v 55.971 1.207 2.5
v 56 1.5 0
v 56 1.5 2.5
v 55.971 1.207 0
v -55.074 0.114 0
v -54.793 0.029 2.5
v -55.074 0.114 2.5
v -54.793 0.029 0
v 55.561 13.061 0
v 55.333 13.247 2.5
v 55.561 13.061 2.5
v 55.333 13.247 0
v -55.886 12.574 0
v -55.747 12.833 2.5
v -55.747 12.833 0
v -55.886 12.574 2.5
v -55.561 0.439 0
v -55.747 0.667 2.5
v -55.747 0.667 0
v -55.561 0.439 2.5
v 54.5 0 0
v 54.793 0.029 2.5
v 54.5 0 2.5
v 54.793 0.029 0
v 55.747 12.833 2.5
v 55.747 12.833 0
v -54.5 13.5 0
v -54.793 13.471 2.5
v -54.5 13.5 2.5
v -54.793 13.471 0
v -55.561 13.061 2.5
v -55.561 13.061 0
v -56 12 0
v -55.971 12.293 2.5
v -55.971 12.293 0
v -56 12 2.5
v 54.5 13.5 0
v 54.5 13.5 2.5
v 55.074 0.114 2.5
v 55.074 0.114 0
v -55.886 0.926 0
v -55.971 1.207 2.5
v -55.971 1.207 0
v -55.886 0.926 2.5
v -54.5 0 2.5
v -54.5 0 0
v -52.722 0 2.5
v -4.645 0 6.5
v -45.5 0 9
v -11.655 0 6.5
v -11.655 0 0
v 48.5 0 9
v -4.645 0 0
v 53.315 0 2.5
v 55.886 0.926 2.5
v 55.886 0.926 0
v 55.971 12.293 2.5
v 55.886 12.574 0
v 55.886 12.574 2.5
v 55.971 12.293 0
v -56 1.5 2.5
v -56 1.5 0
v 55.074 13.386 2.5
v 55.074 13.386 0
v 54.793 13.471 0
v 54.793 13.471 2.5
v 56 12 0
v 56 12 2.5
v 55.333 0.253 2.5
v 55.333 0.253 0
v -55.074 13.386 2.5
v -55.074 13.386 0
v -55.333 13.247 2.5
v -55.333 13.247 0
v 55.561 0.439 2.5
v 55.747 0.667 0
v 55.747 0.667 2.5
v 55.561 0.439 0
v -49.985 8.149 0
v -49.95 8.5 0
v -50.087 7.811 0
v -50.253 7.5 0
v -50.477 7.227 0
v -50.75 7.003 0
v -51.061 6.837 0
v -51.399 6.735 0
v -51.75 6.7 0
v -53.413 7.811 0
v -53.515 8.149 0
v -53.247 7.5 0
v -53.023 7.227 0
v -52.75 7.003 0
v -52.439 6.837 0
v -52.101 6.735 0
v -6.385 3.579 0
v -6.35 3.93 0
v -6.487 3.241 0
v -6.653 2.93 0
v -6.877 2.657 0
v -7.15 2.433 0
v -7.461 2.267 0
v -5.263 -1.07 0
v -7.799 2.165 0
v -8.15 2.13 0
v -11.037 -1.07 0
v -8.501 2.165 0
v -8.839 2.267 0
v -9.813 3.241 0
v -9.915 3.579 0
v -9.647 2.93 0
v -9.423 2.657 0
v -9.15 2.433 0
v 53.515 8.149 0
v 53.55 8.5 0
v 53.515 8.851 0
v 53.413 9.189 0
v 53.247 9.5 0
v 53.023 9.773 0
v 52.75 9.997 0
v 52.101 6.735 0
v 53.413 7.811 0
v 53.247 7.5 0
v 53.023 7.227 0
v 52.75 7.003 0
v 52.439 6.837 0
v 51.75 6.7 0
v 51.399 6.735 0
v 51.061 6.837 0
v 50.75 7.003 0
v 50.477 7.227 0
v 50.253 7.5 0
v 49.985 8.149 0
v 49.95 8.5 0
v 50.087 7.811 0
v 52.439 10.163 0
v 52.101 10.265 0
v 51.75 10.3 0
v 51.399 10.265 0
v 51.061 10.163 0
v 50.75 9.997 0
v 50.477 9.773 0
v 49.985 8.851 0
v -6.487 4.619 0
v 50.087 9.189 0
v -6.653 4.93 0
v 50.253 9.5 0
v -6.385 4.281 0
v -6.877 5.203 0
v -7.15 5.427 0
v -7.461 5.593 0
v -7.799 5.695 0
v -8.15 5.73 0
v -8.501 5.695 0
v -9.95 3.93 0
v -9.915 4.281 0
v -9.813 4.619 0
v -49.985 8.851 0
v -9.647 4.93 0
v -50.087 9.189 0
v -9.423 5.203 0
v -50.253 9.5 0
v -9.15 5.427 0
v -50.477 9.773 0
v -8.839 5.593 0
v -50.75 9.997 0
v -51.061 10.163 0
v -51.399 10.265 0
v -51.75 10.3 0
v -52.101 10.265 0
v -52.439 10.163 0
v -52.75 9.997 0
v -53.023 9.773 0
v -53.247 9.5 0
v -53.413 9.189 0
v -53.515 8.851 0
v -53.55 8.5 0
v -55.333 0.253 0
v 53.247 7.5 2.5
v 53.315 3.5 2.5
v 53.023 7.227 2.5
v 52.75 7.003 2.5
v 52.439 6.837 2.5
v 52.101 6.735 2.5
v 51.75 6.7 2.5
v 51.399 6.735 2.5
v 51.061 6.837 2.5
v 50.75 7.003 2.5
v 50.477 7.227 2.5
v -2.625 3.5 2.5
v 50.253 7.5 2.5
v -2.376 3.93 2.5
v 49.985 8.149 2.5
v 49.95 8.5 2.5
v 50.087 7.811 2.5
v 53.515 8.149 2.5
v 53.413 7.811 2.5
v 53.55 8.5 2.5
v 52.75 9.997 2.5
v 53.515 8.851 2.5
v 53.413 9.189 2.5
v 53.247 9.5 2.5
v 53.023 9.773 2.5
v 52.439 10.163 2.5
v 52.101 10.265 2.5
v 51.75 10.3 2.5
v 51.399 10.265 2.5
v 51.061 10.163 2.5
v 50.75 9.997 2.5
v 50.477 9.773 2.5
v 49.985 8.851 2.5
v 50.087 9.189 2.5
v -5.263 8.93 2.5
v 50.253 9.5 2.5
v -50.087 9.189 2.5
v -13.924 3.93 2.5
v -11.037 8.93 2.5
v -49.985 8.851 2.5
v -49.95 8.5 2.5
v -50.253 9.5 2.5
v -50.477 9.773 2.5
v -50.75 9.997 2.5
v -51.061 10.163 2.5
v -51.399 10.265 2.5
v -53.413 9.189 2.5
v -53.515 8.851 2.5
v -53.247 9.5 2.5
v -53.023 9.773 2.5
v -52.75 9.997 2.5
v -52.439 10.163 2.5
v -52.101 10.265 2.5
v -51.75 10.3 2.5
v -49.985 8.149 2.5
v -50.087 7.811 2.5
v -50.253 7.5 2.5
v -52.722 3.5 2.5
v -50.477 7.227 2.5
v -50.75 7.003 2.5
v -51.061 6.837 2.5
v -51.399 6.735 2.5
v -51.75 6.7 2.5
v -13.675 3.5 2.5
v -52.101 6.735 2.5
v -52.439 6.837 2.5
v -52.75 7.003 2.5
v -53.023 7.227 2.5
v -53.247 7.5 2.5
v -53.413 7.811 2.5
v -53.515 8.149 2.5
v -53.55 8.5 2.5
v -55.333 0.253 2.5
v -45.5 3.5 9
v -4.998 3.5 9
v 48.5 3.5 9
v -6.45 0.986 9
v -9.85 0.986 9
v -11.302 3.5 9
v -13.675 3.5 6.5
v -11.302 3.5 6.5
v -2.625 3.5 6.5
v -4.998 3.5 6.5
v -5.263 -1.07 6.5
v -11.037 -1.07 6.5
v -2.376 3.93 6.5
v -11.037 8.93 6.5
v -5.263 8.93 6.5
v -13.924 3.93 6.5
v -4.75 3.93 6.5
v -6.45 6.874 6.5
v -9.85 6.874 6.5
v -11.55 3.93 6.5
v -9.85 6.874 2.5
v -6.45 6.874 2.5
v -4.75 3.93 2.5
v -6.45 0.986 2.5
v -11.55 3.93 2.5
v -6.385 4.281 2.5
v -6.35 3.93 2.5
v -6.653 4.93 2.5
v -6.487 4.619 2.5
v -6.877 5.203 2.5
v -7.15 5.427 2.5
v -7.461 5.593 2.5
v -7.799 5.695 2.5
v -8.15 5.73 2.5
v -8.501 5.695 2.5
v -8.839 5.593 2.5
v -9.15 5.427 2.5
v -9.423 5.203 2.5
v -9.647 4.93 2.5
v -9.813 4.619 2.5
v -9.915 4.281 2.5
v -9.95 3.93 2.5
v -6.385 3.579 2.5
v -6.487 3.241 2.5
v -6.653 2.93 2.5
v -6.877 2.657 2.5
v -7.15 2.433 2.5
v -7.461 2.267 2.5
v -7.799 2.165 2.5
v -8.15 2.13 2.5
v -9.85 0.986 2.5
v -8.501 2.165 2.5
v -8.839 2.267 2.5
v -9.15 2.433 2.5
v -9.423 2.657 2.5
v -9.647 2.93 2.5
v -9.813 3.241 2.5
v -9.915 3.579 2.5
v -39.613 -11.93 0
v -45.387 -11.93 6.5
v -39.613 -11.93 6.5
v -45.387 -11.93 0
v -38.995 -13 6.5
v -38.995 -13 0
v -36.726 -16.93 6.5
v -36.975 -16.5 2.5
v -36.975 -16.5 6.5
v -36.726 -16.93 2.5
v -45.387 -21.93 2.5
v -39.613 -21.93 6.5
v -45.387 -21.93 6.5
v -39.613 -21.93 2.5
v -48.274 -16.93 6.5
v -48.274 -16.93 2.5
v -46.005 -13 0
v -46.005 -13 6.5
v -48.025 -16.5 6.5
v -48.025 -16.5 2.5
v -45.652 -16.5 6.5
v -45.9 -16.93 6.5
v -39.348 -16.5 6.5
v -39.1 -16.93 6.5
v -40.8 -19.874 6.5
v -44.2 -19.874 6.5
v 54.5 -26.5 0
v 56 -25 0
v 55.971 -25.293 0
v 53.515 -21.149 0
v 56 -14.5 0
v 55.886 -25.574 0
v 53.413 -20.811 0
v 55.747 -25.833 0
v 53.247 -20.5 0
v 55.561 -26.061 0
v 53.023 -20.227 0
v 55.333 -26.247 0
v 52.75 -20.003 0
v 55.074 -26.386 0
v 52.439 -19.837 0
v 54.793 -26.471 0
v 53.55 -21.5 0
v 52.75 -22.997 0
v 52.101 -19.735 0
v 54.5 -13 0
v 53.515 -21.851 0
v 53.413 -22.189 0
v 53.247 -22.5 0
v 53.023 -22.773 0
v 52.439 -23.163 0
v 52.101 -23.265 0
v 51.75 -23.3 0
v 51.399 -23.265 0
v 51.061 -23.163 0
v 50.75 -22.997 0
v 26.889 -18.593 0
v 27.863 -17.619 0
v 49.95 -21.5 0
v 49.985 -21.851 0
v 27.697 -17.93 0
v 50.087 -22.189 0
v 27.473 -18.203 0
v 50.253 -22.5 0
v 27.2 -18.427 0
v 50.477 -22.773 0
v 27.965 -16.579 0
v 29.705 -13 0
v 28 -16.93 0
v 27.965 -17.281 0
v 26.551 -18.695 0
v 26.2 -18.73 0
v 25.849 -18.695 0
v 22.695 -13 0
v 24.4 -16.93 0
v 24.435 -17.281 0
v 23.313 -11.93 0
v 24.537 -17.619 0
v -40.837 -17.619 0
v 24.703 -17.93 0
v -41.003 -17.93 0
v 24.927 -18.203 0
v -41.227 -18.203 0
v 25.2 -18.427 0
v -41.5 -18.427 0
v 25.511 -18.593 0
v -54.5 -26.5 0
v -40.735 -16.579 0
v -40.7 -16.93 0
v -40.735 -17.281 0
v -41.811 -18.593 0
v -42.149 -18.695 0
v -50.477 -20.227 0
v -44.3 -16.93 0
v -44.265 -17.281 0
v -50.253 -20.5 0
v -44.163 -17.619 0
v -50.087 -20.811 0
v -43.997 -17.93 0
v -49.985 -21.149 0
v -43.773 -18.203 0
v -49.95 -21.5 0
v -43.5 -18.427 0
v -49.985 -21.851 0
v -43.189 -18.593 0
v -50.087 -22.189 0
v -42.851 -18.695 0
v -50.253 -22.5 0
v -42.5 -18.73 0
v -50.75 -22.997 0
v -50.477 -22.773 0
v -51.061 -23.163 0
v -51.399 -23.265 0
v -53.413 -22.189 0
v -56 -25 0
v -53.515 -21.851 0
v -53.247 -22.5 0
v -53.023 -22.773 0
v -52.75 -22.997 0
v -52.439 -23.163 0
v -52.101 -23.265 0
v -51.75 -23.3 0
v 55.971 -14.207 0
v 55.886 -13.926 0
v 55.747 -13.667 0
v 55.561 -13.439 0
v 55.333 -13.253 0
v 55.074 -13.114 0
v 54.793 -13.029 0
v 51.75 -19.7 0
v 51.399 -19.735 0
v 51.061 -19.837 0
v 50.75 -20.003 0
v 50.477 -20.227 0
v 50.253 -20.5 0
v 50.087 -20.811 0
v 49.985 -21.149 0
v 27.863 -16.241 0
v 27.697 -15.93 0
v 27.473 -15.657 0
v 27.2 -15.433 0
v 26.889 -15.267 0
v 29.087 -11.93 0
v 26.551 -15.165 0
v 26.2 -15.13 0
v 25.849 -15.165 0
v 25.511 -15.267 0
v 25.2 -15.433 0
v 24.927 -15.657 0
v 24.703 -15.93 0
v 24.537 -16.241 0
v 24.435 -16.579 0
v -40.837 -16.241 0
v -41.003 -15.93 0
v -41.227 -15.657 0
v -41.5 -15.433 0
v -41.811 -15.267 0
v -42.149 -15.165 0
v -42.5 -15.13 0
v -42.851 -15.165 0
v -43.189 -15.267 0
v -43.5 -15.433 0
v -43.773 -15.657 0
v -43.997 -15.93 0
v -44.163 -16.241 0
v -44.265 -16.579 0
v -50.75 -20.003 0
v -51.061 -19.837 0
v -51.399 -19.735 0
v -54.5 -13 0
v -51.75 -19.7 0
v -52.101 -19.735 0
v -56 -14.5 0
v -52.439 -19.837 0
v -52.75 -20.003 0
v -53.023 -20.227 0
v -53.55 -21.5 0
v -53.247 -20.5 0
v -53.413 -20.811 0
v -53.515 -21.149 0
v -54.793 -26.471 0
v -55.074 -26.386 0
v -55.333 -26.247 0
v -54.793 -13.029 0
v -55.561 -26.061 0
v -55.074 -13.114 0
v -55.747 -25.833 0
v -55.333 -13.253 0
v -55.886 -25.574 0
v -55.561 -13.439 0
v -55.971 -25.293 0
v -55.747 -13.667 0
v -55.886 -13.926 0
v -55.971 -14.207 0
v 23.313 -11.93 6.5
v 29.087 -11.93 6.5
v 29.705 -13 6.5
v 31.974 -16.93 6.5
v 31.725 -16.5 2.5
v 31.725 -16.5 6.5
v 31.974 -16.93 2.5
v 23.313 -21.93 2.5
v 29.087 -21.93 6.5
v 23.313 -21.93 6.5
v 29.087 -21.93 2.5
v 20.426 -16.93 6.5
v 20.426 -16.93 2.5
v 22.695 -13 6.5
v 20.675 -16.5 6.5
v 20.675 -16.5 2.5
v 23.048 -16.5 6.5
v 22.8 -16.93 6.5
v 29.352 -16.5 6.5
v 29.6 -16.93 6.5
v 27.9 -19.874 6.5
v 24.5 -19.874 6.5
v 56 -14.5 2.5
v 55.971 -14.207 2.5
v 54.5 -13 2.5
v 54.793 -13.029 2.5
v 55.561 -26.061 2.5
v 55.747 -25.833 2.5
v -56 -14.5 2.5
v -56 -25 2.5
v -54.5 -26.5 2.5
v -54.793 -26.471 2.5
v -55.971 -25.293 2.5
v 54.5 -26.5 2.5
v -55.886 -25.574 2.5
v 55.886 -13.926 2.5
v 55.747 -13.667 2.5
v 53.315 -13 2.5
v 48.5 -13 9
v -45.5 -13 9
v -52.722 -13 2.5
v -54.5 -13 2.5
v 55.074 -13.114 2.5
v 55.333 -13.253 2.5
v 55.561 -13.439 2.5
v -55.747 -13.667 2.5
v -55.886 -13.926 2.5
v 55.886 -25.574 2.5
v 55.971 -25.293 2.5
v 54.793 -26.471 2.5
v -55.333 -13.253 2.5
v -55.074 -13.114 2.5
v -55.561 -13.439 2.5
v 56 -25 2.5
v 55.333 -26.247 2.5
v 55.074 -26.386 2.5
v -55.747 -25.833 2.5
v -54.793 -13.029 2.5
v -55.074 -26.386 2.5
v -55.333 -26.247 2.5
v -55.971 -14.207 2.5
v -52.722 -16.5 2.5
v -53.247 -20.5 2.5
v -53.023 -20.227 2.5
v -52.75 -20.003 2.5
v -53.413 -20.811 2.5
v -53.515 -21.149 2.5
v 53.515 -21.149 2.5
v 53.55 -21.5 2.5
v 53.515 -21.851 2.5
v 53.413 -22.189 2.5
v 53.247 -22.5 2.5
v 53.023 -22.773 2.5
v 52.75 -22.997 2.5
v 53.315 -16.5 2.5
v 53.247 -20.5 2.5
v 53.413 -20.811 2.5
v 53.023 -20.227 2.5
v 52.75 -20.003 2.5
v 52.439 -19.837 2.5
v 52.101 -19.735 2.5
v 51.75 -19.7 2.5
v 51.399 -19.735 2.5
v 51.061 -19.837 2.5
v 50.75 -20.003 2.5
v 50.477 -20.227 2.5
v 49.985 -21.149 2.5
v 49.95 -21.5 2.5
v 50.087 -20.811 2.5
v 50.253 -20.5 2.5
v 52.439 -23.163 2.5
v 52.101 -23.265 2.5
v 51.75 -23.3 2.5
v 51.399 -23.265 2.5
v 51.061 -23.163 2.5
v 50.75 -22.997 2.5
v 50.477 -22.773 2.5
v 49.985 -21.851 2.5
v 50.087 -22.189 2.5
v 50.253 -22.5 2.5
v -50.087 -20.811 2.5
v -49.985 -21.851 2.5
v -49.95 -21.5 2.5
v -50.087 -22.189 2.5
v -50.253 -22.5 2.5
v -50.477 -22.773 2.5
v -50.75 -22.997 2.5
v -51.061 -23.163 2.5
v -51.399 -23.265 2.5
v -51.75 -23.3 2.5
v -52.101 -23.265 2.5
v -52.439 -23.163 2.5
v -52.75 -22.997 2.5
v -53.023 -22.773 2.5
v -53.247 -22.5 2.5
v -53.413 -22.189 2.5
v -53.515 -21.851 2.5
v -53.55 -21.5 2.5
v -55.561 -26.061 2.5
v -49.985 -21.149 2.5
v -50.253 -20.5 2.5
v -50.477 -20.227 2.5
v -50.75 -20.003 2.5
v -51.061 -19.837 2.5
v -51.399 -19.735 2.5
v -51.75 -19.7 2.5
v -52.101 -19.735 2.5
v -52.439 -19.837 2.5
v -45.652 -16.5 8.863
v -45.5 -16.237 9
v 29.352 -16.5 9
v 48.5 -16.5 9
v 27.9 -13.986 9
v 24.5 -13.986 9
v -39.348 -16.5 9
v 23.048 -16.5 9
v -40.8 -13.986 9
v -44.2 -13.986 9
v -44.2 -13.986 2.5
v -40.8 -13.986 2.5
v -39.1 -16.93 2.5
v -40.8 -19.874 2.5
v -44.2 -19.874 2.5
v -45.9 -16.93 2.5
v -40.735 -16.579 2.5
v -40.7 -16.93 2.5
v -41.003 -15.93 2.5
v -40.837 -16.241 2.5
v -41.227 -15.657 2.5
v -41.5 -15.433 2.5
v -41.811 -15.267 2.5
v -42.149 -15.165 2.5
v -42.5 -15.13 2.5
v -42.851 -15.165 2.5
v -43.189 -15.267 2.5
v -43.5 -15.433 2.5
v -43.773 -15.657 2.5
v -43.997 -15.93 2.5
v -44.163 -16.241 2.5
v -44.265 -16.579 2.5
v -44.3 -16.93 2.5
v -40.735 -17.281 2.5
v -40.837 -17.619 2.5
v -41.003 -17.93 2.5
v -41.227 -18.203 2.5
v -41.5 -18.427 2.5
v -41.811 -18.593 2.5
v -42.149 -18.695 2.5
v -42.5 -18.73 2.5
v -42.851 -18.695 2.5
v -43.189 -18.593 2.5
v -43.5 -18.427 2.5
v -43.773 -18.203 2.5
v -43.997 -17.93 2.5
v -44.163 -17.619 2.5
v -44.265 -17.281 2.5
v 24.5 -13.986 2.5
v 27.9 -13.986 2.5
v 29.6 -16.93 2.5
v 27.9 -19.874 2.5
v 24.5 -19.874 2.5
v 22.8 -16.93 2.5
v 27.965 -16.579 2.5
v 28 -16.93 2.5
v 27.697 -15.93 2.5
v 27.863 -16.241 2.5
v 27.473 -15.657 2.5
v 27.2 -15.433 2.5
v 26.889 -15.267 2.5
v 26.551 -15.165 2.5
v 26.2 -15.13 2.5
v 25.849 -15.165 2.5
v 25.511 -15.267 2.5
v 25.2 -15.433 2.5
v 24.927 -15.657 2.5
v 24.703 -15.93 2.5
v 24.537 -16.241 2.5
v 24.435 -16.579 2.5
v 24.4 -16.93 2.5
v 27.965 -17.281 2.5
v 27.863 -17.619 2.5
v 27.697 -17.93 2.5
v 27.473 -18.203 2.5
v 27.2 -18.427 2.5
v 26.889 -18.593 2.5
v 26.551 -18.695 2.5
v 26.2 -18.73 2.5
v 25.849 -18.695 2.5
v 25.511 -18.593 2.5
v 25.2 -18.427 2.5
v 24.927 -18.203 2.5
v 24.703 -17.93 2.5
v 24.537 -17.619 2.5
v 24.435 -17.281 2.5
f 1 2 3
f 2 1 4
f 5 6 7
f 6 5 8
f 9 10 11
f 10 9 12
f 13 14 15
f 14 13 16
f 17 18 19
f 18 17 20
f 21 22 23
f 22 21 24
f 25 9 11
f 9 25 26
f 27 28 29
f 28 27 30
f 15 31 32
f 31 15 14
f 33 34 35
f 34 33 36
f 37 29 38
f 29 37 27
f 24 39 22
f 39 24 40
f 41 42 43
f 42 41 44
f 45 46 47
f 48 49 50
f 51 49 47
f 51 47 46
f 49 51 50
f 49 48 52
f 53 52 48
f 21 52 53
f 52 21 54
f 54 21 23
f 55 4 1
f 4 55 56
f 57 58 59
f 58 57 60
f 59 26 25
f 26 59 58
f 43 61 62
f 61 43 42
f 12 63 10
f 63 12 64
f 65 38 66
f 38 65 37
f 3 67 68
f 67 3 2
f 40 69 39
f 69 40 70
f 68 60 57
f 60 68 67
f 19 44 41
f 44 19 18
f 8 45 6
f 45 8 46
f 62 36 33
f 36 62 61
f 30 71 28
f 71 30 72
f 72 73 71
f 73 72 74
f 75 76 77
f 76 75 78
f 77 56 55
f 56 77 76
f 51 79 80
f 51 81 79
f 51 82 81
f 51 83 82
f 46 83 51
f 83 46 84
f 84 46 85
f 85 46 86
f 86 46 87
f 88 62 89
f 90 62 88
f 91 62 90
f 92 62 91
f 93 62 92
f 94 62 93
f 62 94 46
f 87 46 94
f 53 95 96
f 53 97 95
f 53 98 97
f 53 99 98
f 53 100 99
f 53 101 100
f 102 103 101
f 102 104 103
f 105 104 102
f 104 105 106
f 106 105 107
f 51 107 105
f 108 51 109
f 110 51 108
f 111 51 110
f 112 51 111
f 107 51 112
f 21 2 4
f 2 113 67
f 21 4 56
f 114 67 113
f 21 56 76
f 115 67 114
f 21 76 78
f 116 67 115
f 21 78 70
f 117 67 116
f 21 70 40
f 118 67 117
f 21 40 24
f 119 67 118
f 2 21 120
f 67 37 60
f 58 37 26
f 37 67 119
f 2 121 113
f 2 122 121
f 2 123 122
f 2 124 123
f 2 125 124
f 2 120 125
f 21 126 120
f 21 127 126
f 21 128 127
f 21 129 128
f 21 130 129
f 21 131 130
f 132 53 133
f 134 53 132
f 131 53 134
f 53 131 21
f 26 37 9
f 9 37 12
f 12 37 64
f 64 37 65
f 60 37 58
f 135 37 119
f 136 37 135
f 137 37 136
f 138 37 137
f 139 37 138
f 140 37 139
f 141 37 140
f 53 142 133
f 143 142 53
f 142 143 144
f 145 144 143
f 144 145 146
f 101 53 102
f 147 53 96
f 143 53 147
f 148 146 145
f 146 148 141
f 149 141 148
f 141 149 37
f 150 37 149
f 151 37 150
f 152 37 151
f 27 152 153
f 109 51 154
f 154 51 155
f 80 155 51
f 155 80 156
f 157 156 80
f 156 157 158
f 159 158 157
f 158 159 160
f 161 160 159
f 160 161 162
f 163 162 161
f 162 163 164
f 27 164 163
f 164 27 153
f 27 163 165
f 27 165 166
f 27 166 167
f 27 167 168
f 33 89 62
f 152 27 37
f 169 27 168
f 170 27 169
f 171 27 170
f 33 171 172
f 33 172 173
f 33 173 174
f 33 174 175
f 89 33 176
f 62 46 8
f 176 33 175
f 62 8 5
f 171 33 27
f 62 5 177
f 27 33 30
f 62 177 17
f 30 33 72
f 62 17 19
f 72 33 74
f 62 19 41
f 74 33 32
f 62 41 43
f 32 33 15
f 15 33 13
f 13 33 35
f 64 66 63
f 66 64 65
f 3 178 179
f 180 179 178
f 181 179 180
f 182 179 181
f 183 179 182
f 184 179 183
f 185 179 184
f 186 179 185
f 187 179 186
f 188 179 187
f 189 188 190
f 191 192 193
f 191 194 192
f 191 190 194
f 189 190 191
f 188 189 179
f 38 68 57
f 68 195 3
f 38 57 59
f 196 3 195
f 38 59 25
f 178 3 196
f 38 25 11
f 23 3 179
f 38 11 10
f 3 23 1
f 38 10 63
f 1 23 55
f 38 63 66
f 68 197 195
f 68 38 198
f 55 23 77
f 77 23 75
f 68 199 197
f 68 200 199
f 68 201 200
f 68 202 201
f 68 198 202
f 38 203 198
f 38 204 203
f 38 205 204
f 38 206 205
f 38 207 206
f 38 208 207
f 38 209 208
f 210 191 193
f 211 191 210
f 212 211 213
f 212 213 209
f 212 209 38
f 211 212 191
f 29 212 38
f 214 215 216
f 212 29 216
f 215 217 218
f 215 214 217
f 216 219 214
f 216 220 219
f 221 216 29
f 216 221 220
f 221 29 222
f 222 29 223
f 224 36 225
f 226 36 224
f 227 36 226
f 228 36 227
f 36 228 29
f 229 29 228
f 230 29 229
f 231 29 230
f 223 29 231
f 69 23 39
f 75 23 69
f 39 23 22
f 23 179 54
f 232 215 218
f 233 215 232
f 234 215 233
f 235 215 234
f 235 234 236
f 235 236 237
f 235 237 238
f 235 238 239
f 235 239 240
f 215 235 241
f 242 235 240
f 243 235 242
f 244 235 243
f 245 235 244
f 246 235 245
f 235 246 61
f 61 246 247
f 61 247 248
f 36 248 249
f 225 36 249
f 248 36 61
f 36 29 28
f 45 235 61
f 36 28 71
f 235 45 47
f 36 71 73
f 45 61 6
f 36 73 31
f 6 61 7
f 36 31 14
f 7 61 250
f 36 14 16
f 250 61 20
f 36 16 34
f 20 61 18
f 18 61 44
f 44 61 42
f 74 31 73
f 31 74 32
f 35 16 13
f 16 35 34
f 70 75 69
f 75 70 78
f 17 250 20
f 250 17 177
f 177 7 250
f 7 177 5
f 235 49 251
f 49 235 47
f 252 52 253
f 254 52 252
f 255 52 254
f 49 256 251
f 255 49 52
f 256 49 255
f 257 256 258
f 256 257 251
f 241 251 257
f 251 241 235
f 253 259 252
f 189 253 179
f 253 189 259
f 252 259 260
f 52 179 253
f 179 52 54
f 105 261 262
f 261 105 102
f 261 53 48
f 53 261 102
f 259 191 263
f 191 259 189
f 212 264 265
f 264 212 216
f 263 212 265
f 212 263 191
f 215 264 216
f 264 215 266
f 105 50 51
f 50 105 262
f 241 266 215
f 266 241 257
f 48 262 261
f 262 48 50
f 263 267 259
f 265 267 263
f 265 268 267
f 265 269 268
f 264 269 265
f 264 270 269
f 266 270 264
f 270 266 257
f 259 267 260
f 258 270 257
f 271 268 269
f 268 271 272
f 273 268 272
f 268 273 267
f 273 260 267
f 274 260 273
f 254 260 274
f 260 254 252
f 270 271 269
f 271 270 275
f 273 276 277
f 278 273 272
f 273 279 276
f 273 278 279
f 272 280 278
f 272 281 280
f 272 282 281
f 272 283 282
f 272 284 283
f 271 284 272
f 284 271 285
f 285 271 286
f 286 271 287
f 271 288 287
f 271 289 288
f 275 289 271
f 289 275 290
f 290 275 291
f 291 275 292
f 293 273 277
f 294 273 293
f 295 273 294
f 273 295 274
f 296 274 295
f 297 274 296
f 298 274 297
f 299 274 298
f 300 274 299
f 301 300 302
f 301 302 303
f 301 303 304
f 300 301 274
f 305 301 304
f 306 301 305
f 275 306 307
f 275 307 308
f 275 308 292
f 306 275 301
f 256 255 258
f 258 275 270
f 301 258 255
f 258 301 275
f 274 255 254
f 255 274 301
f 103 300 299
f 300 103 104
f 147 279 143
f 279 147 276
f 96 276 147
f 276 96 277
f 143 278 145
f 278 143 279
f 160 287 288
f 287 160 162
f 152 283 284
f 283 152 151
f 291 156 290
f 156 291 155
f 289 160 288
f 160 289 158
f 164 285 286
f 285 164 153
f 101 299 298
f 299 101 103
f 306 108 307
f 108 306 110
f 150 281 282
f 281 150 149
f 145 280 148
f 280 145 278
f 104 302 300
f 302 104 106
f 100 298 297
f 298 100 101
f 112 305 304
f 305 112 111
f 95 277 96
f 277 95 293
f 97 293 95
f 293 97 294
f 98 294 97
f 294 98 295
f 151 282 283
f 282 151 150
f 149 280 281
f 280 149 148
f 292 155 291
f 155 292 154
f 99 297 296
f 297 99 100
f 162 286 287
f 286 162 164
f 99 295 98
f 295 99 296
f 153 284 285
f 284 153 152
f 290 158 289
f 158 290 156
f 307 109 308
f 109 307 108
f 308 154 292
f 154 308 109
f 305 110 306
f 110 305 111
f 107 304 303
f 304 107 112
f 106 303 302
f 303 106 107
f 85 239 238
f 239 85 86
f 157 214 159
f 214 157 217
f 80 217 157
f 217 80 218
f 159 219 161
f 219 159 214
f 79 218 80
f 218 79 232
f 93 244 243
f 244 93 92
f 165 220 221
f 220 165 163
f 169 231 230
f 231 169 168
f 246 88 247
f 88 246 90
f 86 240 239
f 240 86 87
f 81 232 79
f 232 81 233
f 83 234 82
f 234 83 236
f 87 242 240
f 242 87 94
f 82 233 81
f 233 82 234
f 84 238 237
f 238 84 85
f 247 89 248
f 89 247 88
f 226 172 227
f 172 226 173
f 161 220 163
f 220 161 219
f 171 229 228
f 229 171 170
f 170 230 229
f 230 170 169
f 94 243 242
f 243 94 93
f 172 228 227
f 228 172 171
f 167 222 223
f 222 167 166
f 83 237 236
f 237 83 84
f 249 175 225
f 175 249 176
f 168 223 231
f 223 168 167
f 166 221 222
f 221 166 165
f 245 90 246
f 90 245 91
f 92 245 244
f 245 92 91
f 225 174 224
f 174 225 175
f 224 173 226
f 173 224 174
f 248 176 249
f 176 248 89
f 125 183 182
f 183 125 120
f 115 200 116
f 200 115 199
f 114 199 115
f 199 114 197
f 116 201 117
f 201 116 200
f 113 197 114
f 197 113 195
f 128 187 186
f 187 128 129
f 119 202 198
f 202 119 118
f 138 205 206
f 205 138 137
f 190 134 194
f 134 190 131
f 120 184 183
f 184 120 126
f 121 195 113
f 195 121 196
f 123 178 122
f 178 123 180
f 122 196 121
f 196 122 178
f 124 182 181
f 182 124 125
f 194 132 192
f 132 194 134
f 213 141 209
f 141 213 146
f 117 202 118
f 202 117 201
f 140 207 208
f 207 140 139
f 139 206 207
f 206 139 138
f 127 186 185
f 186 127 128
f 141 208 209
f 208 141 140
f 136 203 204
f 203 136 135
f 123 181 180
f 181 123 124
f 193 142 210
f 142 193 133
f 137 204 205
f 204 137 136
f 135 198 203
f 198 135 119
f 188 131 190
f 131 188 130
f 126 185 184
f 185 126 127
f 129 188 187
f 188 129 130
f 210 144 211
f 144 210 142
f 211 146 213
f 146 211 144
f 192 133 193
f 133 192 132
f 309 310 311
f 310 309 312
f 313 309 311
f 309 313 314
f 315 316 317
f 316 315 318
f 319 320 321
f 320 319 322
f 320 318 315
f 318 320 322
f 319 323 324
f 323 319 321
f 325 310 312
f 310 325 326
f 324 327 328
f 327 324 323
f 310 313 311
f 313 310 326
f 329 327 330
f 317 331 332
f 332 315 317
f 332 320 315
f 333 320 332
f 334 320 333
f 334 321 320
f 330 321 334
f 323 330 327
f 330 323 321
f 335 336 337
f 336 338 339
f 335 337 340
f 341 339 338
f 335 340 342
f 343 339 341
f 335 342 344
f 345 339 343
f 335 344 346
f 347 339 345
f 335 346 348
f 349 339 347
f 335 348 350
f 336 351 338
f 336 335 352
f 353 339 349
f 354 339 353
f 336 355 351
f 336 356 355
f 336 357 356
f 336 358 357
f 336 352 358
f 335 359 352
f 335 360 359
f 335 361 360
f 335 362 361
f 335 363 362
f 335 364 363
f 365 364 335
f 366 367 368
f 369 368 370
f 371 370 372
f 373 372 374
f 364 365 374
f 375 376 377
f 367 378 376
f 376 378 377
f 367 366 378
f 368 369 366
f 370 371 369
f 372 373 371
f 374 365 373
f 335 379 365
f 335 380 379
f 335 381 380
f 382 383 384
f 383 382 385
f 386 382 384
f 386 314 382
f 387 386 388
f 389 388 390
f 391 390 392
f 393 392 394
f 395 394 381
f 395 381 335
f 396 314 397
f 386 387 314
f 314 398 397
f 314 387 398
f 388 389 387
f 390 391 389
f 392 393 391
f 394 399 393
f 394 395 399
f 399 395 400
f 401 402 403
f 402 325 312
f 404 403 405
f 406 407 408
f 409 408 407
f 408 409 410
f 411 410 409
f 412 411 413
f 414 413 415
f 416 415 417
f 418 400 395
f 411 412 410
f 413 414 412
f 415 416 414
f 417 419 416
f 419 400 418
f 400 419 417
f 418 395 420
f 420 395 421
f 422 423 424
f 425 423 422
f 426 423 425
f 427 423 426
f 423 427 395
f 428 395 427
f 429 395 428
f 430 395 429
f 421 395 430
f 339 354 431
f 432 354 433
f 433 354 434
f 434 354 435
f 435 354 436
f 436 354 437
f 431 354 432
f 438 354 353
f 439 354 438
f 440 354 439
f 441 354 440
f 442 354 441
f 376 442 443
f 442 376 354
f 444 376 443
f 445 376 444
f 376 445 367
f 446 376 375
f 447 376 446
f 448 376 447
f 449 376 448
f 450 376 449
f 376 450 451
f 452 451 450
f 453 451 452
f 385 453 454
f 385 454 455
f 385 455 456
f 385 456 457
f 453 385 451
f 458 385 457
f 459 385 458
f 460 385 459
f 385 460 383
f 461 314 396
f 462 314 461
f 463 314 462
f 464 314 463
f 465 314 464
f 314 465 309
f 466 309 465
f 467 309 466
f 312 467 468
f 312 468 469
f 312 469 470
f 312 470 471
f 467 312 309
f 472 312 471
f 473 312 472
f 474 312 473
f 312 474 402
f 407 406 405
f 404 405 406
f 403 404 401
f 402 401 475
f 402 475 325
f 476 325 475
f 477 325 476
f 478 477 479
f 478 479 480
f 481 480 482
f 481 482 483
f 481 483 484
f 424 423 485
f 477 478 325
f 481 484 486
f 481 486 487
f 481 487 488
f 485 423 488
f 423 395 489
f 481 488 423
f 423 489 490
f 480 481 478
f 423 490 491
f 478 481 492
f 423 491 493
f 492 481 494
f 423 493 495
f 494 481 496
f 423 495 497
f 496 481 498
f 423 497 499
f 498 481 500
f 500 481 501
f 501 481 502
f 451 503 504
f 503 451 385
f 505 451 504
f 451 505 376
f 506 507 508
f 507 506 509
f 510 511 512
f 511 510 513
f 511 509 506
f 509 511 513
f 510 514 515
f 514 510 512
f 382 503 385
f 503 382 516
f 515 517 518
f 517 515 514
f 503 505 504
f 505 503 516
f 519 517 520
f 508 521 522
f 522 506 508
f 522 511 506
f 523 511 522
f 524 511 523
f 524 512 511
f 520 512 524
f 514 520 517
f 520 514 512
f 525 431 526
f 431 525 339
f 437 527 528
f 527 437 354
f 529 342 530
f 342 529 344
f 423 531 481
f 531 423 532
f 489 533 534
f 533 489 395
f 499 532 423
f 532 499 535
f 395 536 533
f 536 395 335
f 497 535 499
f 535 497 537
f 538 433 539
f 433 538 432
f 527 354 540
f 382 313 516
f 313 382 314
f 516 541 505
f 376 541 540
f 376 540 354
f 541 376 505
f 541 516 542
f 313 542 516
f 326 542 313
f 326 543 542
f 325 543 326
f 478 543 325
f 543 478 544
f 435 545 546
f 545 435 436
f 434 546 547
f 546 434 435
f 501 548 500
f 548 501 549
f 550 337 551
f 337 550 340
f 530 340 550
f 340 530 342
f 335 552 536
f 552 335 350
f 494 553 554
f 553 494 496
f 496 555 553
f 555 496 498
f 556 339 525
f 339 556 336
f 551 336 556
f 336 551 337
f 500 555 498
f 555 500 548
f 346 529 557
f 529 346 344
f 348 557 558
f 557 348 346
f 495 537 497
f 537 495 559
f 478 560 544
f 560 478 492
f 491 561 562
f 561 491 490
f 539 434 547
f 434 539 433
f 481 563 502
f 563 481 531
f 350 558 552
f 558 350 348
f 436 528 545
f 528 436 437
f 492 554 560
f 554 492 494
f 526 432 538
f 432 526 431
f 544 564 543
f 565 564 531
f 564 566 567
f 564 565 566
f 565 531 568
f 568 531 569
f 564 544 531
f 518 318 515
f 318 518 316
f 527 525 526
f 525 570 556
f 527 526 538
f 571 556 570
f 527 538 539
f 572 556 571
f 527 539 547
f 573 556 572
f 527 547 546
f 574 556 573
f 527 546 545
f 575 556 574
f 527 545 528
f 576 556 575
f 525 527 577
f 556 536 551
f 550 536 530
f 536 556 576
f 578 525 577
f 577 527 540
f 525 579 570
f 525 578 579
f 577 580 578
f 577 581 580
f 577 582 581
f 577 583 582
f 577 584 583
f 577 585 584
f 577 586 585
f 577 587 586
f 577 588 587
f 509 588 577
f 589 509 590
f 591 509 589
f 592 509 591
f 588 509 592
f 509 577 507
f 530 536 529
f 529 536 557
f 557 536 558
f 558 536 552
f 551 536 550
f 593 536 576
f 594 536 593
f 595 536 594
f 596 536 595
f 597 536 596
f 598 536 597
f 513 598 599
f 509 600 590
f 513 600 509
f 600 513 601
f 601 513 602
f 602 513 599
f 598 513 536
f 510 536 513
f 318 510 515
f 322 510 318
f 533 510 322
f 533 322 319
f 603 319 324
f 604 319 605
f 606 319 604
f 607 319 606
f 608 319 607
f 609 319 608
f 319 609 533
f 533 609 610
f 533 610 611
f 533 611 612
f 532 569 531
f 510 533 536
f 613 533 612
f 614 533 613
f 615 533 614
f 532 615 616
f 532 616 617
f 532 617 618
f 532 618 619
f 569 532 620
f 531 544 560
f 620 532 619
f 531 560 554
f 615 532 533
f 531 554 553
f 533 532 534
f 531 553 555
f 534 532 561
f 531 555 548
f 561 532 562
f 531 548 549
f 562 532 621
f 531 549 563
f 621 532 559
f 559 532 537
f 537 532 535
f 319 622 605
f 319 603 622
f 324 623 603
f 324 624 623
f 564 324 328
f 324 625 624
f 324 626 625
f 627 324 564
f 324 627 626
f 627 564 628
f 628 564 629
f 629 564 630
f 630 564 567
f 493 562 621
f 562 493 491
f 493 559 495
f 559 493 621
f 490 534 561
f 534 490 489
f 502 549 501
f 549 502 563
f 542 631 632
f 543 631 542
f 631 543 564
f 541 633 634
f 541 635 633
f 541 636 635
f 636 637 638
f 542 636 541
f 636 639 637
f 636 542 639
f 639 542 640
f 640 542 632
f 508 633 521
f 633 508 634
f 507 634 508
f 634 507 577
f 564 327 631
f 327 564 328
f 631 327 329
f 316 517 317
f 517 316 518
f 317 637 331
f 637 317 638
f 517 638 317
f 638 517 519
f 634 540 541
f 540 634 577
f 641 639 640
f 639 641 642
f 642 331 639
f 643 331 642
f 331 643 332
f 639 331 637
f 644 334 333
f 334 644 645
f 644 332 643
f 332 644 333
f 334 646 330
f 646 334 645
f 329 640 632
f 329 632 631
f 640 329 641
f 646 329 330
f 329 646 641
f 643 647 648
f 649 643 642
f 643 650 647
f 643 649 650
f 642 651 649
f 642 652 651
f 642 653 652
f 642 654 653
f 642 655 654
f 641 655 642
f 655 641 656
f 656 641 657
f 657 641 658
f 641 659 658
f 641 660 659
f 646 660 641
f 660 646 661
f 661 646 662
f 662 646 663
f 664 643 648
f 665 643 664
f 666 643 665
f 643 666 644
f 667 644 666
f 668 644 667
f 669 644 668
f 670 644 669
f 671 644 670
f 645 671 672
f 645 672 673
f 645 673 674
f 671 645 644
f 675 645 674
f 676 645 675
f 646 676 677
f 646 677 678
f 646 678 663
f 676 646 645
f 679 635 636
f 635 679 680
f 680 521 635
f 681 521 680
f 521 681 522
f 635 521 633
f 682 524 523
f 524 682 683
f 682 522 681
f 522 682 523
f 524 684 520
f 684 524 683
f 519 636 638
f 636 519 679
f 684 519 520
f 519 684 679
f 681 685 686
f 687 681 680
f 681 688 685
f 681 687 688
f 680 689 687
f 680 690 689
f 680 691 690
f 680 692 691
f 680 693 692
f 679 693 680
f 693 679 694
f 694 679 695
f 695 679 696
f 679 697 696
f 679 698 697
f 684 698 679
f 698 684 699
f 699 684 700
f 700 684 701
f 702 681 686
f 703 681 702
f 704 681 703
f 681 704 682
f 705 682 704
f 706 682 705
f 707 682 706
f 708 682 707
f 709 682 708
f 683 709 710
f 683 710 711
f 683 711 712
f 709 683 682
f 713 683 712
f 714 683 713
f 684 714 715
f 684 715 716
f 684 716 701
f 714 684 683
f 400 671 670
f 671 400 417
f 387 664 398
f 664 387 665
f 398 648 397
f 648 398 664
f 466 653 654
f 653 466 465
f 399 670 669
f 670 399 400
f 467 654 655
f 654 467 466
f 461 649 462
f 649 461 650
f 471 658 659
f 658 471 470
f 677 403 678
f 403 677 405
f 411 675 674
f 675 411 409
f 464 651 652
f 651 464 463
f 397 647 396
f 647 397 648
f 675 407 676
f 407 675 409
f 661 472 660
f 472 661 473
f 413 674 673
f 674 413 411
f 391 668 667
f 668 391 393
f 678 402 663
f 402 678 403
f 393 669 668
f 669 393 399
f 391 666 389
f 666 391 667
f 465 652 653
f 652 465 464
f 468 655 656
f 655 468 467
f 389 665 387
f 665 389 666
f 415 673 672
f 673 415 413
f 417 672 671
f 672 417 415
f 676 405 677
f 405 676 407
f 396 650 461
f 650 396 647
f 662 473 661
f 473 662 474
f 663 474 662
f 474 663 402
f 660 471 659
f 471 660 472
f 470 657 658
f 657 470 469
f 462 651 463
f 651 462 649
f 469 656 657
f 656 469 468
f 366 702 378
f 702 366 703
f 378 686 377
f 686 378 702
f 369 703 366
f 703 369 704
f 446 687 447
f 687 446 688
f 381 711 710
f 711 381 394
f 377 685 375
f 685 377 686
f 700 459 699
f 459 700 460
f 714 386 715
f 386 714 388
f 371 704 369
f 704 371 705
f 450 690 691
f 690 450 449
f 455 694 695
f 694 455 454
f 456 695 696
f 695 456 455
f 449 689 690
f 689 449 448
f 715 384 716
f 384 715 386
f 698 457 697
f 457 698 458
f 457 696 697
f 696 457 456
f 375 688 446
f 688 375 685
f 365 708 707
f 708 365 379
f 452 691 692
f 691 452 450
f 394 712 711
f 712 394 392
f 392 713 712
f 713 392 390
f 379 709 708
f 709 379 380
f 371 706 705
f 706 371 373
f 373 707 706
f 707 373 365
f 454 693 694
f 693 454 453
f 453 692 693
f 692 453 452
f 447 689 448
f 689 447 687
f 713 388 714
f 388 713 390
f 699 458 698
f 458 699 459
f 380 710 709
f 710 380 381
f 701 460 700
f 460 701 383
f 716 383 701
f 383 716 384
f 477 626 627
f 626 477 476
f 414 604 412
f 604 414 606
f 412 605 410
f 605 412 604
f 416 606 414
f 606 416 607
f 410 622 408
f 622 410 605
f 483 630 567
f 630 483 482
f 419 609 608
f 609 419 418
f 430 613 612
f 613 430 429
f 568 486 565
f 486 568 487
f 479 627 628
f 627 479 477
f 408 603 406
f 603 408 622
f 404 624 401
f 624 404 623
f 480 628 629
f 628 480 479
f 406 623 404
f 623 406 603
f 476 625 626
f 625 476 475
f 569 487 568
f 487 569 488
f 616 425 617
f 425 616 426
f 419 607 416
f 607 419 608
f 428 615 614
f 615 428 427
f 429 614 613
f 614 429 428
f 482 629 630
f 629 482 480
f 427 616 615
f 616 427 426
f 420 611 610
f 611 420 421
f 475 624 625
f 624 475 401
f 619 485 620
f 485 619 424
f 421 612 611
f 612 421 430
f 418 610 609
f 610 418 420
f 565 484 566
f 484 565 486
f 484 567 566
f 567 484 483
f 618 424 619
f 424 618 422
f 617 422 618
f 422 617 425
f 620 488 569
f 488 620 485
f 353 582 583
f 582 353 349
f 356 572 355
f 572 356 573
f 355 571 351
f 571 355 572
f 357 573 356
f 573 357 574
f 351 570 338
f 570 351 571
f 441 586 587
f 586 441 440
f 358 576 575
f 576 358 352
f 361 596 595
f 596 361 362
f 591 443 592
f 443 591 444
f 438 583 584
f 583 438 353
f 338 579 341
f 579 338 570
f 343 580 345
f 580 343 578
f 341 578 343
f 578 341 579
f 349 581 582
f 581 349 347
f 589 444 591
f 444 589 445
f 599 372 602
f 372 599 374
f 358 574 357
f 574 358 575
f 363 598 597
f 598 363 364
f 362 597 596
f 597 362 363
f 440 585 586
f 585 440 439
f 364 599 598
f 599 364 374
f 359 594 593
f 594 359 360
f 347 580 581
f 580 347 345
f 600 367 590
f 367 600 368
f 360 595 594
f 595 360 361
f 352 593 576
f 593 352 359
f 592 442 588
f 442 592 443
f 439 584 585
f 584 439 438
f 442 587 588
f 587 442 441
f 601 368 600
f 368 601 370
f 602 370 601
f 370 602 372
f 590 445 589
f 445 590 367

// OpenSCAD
// file: metric.scad
// PRUSA iteration3
// Default metric sizes
// GNU GPL v3
// Josef Průša <josefprusa@me.com>
// http://www.reprap.org/wiki/Prusa_Mendel
// http://github.com/prusajr/PrusaMendel

// DONT CHANGE THIS FILE! ALTER VALUES IN CONFIGURATION.SCAD INSTEAD

// RODS

threaded_rod_diameter = 8.7;
threaded_rod_diameter_horizontal = 8.7;
smooth_bar_diameter = 8;
smooth_bar_diameter_horizontal = 8.5;

// Nuts and bolts


m8_diameter = 9;
//iso4032 says Width across corners = 14.38
m8_nut_diameter = 14.1;

m4_diameter = 4.7;
//iso4032 says 7.66
m4_nut_diameter = 7.6;
m4_nut_diameter_horizontal = 8.15;

m3_diameter = 3.6;
//iso4032 says 6.01
m3_nut_diameter = 5.3;
m3_nut_diameter_horizontal = 6.8;
m3_washer_diameter = 6.9;

// Motors

motor_shaft = 5.5;
// main file
include <metric.scad>

boxMountHoleSpacing = 103.5;
boxInsideWidth = 113;
boxWidthGap = 0.5;

boardMountingHoleFromBox = 14;  //The distance from the closest board mounting hole to the inside of th e box

boardMountingHoleSpacing = 68.7;
boxHoleLongSpacing = 134.3;
boardHoleLongSpacing = 125.16;
boardHoleOffsetFromBoxHoles = (boxHoleLongSpacing-boardHoleLongSpacing)/2;

reinforceThickness = 3.5;
width = 10+reinforceThickness;
height = 9;
thickness = 2.5;
nutRetainerOuterAcross = 10/cos(30);
radius = 1.5;

numHoleSegs = 32;

unreinforcedWidth = width-reinforceThickness;

boxHolesCenterY = unreinforcedWidth/2+reinforceThickness;
boardHolesCenterY = boxHolesCenterY - boardHoleOffsetFromBoxHoles;
centerBoardHoleCenterY = boxHolesCenterY - boardHoleOffsetFromBoxHoles;

module GNSMount(inputEnd = 0)
{
length = boxInsideWidth-2*boxWidthGap;
boardMountCenterX = -length/2 + boardMountingHoleFromBox - boxWidthGap + boardMountingHoleSpacing/2;
difference()
	{
	union()
	   {
		translate([-length/2+radius,radius,0])
			minkowski()
				{	
				cube([length-2*radius,width-2*radius,thickness]);
				cylinder(h = thickness/10000, r = radius, $fn = numHoleSegs);
				}
		translate([-length/2+radius,0,0])
			hull()
				{
				translate([height,0,0])
	   	   	cube([length-2*height,reinforceThickness,height]);
	   	   cube([length-2*radius,reinforceThickness,height/10]);
				}
	   if(inputEnd == 1)
			{
	//Center Board mount nut retainer
			translate([boardMountCenterX, centerBoardHoleCenterY, 0])
				NutRetainerPos();
			}
	   else
			{//Output end
			translate([boardMountCenterX - boardMountingHoleSpacing/2,boardHolesCenterY,0])
				NutRetainerPos();
			translate([boardMountCenterX + boardMountingHoleSpacing/2,boardHolesCenterY,0])
				NutRetainerPos();
			}
      }

	   if(inputEnd == 1)
			{
			translate([boardMountCenterX, centerBoardHoleCenterY, 0])
				NutRetainerNeg();
         }
      else
         {
			translate([boardMountCenterX - boardMountingHoleSpacing/2,boardHolesCenterY,0])
				NutRetainerNeg();
			translate([boardMountCenterX + boardMountingHoleSpacing/2,boardHolesCenterY,0])
				NutRetainerNeg();
         }
	   if(inputEnd == 1)
			{
		//Center Board mount hole
			translate([boardMountCenterX, centerBoardHoleCenterY, -thickness/2])
			   cylinder(h = thickness*2, r = m3_diameter/2, $fn = numHoleSegs);
         }
      else
         {
		//Outer Board mount holes
			translate([boardMountCenterX - boardMountingHoleSpacing/2, boardHolesCenterY, -thickness/2])
			   cylinder(h = thickness*2, r = m3_diameter/2, $fn = numHoleSegs);
			translate([boardMountCenterX + boardMountingHoleSpacing/2, boardHolesCenterY, -thickness/2])
			   cylinder(h = thickness*2, r = m3_diameter/2, $fn = numHoleSegs);
         }
//Box mount holes
	translate([-boxMountHoleSpacing/2, boxHolesCenterY, -thickness/2])
	   cylinder(h = thickness*2, r = m3_diameter/2, $fn = numHoleSegs);
	translate([+boxMountHoleSpacing/2, boxHolesCenterY, -thickness/2])
	   cylinder(h = thickness*2, r = m3_diameter/2, $fn = numHoleSegs);
	}
}

module NutRetainerPos(retainerH = 4)
{
//difference()
	{
	//translate([0, 0, thickness]) 
	      cylinder(h =retainerH+thickness, r = nutRetainerOuterAcross/2, $fn = 6);

//		}
	}
}

module NutRetainerNeg(retainerH = 4)
{
	   translate([0, 0, thickness])
			cylinder(h =height, r = m3_nut_diameter_horizontal/2, $fn = 6);

}


GNSMount(inputEnd = 1);

translate([0,-(13),0])
   mirror([0,1,0])
      GNSMount(inputEnd = 0);
